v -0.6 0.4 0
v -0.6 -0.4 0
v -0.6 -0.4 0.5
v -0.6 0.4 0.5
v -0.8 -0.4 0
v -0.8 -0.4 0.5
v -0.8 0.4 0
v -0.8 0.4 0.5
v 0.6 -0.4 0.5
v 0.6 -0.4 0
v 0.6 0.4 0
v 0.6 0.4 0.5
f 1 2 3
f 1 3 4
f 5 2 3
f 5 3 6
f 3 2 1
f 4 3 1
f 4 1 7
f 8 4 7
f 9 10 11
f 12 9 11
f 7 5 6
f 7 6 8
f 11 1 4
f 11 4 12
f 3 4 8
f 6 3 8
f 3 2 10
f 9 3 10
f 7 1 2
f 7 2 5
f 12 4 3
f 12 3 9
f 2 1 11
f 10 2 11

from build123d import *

# Parameters (mm, degrees)
SKETCH_W     = 1.2
SKETCH_H     = 0.8
PAD_DEPTH    = 0.5
SKETCH001_W  = 0.2
SKETCH001_H  = 0.8
PAD001_DEPTH = 0.5


with BuildPart() as body:
    # Sketch → Pad (new body)
    with BuildSketch(Plane.XY):
        Rectangle(SKETCH_W, SKETCH_H)
    extrude(amount=PAD_DEPTH)


with BuildPart() as body001:
    # Sketch001 → Pad001 (new body)
    with BuildSketch(Plane.XY):
        with Locations((0.7, 0)):
            Rectangle(SKETCH001_W, SKETCH001_H)
    extrude(amount=PAD001_DEPTH)


with BuildPart() as part_mirroring:
    # Part__Mirroring: instance of Body001
    add(body001.part.mirror(Plane(origin=(0, 0, 0), x_dir=(0, -1, 0), z_dir=(1, 0, 0))))


solid = Compound([body.part, part_mirroring.part])
